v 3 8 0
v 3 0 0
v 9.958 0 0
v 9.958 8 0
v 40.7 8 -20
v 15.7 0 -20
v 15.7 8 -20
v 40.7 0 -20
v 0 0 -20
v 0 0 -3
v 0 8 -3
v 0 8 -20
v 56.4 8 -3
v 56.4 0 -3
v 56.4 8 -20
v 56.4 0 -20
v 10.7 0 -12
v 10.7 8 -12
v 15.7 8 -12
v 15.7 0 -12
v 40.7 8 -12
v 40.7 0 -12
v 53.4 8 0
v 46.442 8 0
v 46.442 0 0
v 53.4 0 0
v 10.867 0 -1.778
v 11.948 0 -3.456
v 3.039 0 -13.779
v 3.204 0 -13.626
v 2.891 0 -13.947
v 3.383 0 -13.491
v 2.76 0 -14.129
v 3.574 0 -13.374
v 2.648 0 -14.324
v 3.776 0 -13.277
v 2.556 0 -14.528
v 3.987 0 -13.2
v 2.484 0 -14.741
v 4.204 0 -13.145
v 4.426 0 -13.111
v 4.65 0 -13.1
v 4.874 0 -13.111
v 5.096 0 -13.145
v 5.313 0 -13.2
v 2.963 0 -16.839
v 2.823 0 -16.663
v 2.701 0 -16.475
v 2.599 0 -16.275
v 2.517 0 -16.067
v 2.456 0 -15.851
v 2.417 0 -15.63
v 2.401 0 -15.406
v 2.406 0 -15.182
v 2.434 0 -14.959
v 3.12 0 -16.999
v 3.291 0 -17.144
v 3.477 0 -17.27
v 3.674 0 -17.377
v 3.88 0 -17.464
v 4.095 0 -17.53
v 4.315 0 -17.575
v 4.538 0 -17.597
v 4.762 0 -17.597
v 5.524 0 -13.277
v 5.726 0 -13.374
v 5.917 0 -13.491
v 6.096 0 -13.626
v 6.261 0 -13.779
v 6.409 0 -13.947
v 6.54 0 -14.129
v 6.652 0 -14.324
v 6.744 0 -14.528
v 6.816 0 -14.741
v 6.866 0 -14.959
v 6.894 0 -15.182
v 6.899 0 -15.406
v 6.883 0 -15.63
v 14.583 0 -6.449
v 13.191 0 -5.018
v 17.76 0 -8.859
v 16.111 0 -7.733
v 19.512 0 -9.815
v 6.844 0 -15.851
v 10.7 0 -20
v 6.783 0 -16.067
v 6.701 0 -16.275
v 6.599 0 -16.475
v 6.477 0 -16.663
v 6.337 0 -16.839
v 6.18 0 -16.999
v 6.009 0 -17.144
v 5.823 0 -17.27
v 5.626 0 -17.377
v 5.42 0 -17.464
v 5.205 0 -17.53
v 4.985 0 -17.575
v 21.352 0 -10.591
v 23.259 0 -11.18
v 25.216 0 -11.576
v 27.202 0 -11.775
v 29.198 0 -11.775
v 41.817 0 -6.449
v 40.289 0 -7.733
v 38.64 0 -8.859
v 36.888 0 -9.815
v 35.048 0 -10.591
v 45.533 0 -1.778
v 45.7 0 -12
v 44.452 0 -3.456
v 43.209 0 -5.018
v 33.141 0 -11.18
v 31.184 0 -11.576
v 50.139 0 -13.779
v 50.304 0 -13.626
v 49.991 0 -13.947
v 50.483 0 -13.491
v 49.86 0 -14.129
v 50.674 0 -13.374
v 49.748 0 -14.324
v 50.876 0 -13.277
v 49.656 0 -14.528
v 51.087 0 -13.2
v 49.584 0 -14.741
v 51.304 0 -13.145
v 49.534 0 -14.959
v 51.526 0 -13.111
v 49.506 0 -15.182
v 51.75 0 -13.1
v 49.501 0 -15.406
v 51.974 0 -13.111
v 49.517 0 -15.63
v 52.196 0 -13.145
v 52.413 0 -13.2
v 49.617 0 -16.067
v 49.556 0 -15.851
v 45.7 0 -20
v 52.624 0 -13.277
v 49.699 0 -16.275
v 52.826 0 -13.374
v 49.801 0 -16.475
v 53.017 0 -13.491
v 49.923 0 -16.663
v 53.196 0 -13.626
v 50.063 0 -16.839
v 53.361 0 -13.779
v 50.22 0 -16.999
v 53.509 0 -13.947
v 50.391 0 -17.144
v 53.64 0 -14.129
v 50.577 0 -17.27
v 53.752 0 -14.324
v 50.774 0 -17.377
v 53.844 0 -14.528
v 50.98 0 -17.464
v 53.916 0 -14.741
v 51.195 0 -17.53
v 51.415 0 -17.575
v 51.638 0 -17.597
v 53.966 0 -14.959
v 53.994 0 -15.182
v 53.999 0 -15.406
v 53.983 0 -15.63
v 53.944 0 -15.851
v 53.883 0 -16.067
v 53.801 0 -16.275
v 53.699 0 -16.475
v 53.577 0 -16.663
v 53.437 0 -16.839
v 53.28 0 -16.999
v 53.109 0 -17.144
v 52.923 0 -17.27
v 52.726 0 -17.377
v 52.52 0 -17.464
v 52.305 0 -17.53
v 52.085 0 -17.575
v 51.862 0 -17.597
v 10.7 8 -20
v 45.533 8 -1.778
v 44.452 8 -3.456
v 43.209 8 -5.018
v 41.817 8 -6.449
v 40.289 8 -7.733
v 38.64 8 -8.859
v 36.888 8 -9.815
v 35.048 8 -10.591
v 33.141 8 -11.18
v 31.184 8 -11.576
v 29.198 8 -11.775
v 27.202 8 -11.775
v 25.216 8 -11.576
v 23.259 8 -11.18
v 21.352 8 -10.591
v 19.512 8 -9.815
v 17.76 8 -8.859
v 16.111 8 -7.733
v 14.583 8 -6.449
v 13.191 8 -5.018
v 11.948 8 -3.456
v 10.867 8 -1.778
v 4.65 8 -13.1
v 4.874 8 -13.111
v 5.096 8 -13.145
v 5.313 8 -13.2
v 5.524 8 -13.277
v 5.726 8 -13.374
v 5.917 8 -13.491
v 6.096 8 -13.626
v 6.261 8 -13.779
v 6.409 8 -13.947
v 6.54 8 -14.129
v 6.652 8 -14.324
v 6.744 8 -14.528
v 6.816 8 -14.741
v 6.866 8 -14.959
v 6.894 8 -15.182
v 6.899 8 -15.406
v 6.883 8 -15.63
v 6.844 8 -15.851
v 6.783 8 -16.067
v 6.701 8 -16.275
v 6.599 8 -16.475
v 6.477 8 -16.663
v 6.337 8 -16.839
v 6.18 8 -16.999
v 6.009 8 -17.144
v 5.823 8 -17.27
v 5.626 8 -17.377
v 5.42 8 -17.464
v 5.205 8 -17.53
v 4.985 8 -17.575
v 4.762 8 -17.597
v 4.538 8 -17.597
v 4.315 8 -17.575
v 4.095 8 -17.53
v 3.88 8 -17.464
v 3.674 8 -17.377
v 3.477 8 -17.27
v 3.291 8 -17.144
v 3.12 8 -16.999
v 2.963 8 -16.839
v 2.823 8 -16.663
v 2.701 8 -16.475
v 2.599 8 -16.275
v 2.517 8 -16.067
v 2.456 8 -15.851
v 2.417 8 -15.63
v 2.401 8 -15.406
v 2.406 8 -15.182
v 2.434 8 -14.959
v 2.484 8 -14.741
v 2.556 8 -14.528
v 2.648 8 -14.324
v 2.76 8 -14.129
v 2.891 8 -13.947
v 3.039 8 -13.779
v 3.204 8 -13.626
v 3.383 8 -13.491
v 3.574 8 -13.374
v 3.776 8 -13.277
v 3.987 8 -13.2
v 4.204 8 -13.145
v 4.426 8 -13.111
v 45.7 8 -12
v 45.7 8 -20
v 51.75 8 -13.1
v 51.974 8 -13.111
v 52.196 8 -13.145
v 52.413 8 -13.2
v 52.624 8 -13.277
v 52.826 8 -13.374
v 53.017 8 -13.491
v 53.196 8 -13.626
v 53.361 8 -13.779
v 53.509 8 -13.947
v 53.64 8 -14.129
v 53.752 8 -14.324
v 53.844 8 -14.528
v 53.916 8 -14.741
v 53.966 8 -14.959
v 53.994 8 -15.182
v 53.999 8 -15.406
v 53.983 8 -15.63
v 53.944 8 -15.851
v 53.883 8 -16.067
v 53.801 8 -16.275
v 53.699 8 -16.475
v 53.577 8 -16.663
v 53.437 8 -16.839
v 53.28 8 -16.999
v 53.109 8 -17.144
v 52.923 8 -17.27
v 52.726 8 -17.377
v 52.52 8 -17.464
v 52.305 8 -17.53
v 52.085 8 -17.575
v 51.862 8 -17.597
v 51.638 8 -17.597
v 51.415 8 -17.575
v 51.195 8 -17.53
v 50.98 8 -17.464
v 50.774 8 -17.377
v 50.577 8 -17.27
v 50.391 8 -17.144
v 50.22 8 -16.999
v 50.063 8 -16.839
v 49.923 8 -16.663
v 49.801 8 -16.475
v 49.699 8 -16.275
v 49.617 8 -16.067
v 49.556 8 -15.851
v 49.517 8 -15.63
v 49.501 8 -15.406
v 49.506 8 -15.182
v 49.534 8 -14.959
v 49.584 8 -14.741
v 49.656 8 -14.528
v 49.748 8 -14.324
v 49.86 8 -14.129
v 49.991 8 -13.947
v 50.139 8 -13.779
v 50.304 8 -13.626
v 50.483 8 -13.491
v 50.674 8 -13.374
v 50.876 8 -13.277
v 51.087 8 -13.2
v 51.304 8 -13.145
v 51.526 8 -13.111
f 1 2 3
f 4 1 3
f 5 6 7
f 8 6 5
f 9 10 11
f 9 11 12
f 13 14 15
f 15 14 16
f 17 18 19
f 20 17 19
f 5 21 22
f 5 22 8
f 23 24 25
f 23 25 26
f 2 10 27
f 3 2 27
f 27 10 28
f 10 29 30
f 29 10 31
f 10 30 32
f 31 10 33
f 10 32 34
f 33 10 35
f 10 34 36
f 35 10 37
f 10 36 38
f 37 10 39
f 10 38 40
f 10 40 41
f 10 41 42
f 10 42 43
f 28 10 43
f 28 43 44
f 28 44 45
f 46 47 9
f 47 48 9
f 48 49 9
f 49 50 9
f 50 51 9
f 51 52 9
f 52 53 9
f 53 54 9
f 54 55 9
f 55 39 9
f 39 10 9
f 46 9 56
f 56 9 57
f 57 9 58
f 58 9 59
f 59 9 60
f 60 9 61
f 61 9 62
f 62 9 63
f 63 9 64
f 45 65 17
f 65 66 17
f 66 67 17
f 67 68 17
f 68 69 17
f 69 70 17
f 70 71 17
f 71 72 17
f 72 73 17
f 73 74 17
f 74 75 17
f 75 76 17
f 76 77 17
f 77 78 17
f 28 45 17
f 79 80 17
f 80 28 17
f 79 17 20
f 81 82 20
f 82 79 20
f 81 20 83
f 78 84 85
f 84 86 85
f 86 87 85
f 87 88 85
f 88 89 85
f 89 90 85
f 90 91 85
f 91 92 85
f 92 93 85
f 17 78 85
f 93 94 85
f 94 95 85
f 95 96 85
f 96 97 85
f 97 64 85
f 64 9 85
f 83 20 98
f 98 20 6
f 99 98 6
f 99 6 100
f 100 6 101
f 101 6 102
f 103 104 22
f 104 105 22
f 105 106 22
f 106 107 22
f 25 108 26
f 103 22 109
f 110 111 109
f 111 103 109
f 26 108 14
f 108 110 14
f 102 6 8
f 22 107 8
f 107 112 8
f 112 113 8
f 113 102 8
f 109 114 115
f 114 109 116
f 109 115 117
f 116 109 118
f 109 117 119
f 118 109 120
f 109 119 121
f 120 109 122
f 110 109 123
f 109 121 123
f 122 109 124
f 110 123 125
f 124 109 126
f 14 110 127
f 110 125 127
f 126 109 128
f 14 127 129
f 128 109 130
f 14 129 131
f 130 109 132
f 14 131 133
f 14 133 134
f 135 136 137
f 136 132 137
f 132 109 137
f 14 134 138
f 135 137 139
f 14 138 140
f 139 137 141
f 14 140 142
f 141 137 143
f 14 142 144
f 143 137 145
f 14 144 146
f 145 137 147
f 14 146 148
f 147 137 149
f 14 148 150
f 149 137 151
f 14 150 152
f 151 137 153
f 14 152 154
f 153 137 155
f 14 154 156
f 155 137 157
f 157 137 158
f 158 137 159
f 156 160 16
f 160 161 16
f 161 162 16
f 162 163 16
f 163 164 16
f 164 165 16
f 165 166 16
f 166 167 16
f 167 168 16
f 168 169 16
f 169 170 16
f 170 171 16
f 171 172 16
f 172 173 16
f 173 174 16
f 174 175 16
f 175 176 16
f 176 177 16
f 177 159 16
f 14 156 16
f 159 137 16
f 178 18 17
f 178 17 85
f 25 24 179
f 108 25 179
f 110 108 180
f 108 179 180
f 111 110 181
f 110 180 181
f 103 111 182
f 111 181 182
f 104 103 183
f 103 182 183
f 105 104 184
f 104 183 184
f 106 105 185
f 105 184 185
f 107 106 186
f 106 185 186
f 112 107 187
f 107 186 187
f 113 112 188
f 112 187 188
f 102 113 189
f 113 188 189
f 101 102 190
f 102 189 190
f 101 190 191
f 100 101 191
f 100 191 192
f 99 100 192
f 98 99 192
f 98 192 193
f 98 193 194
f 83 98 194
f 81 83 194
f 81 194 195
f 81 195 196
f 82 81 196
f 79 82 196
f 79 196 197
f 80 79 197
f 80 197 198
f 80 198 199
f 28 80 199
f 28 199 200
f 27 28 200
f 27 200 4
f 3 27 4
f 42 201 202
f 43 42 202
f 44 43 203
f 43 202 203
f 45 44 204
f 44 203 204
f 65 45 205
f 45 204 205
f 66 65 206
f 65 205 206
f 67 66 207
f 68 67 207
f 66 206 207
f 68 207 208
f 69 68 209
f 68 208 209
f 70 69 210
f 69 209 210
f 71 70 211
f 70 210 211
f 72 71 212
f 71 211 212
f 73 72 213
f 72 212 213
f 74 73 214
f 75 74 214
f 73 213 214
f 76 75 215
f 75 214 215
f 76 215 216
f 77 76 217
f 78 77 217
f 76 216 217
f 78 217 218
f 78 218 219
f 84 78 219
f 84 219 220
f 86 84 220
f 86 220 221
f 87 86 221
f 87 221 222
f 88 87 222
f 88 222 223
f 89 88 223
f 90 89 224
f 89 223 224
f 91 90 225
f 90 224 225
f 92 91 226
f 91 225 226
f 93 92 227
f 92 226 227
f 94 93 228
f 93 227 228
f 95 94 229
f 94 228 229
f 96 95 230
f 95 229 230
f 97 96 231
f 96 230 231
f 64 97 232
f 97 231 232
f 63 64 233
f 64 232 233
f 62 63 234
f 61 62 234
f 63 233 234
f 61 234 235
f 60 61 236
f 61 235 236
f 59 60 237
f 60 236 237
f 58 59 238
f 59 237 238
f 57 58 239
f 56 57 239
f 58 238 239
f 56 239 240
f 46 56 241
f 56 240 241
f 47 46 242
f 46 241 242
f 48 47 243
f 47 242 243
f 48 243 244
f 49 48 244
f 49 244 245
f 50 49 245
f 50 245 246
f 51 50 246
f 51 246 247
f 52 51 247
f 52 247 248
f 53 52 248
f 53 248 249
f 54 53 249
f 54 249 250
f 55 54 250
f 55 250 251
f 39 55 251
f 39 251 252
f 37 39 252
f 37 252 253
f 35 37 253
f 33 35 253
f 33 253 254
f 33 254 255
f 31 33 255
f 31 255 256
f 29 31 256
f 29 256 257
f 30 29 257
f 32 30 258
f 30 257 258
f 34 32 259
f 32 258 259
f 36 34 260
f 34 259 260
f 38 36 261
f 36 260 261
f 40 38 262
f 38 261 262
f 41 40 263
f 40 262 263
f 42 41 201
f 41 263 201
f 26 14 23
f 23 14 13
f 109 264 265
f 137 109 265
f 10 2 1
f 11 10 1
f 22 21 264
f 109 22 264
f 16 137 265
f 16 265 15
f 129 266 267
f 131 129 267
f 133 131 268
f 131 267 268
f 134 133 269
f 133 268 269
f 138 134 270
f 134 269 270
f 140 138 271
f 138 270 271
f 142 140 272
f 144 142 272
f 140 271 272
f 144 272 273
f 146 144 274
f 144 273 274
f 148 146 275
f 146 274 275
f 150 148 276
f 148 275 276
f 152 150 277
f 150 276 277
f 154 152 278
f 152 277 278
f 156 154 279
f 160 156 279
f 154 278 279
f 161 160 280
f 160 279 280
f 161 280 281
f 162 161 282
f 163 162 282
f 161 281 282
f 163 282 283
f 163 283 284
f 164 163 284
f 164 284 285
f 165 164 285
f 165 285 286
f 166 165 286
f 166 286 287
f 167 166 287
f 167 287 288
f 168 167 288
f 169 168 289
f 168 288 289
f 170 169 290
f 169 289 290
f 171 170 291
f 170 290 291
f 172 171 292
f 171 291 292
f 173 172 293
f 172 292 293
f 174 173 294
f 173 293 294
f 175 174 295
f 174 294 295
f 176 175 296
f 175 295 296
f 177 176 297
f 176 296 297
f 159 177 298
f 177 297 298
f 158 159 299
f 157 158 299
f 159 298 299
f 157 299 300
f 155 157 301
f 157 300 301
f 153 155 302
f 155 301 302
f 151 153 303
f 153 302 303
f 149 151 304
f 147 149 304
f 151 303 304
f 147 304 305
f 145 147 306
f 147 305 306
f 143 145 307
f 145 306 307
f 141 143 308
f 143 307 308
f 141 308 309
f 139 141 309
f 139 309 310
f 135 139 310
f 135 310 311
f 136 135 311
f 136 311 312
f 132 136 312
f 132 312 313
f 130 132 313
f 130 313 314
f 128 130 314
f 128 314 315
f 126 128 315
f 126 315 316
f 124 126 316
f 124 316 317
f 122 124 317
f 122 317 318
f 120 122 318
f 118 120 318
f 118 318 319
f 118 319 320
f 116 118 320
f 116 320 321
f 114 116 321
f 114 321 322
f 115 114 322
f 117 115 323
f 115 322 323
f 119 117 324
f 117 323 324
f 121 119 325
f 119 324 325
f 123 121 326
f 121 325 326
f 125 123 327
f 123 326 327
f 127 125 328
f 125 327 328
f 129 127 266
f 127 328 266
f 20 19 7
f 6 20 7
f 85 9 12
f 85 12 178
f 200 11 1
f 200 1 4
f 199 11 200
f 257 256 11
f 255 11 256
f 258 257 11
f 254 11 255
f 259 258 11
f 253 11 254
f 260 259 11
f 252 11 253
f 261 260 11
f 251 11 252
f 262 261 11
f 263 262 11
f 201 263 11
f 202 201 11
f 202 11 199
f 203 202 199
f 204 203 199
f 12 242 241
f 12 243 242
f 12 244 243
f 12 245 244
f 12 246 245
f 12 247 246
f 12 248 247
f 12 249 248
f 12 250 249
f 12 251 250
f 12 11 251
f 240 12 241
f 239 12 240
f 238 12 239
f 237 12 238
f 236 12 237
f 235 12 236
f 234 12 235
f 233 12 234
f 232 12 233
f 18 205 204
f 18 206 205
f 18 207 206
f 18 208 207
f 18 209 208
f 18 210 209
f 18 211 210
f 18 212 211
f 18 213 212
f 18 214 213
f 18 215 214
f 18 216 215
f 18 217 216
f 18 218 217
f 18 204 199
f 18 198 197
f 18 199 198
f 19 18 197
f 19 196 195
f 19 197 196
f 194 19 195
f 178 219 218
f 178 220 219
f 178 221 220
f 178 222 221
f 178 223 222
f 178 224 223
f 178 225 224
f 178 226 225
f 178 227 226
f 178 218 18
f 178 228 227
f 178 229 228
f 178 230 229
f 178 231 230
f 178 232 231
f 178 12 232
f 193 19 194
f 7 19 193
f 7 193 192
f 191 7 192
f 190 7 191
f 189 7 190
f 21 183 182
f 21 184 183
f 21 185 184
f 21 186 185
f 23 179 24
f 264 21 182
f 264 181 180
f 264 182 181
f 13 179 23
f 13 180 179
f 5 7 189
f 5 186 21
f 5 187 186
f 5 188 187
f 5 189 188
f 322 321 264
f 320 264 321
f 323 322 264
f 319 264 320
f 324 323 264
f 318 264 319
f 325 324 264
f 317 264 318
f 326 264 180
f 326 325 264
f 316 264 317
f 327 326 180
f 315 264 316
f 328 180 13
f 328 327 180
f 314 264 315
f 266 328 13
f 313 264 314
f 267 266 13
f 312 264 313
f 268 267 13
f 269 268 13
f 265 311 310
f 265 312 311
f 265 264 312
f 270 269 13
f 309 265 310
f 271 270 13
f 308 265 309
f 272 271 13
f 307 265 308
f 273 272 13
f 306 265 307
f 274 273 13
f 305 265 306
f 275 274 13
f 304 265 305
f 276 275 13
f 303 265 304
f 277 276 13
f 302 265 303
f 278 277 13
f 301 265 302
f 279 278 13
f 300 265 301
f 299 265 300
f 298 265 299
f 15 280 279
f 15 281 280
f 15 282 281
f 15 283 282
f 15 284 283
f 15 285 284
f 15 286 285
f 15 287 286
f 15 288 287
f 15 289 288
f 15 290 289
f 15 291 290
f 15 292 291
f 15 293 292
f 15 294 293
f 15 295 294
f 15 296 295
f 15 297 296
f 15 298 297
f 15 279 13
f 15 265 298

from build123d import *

# Parameters (mm, degrees)
SKETCH_1_W          = 56.4
SKETCH_1_H          = 20
EXTRUDE_1_DEPTH     = 8
SKETCH_2_R          = 2.25
CUT_EXTRUDE_1_DEPTH = 8
CHAMFER_1_SIZE      = 3
SKETCH_3_R          = 20
CUT_EXTRUDE_2_DEPTH = 8
SKETCH_4_W          = 5
SKETCH_4_H          = 8
CUT_EXTRUDE_3_DEPTH = 8


with BuildPart() as part:
    # 스케치1 → 보스-돌출1 (new body)
    with BuildSketch(Plane(origin=(0, 0, 0), x_dir=(1, 0, 0), z_dir=(0, 1, 0))):
        with Locations((28.2, 10)):
            Rectangle(SKETCH_1_W, SKETCH_1_H)
    extrude(amount=EXTRUDE_1_DEPTH)

    # 스케치2 → 컷-돌출1 (cut)
    with BuildSketch(Plane(origin=(0, 8, 0), x_dir=(1, 0, 0), z_dir=(0, 1, 0))):
        with Locations(Location((51.75, 15.35, 0), (0, 0, 270))):
            Circle(SKETCH_2_R)
        with Locations(Location((4.65, 15.35, 0), (0, 0, 270))):
            Circle(SKETCH_2_R)
    extrude(amount=-CUT_EXTRUDE_1_DEPTH, mode=Mode.SUBTRACT)

    # 모따기1
    chamfer_1_edges = [part.edges().sort_by_distance(p)[0] for p in [
        (56.4, 4, 0),
        (0, 4, 0),
    ]]
    chamfer(chamfer_1_edges, length=CHAMFER_1_SIZE)

    # 스케치3 → 컷-돌출2 (cut)
    with BuildSketch(Plane(origin=(0, 8, 0), x_dir=(1, 0, 0), z_dir=(0, 1, 0))):
        with Locations((28.2, -8.2)):
            Circle(SKETCH_3_R)
    extrude(amount=-CUT_EXTRUDE_2_DEPTH, mode=Mode.SUBTRACT)

    # 스케치4 → 컷-돌출3 (cut)
    with BuildSketch(Plane(origin=(0, 8, 0), x_dir=(1, 0, 0), z_dir=(0, 1, 0))):
        with Locations((13.2, 16)):
            Rectangle(SKETCH_4_W, SKETCH_4_H)
        with Locations((43.2, 16)):
            Rectangle(SKETCH_4_W, SKETCH_4_H)
    extrude(amount=-CUT_EXTRUDE_3_DEPTH, mode=Mode.SUBTRACT)


solid = part.part
